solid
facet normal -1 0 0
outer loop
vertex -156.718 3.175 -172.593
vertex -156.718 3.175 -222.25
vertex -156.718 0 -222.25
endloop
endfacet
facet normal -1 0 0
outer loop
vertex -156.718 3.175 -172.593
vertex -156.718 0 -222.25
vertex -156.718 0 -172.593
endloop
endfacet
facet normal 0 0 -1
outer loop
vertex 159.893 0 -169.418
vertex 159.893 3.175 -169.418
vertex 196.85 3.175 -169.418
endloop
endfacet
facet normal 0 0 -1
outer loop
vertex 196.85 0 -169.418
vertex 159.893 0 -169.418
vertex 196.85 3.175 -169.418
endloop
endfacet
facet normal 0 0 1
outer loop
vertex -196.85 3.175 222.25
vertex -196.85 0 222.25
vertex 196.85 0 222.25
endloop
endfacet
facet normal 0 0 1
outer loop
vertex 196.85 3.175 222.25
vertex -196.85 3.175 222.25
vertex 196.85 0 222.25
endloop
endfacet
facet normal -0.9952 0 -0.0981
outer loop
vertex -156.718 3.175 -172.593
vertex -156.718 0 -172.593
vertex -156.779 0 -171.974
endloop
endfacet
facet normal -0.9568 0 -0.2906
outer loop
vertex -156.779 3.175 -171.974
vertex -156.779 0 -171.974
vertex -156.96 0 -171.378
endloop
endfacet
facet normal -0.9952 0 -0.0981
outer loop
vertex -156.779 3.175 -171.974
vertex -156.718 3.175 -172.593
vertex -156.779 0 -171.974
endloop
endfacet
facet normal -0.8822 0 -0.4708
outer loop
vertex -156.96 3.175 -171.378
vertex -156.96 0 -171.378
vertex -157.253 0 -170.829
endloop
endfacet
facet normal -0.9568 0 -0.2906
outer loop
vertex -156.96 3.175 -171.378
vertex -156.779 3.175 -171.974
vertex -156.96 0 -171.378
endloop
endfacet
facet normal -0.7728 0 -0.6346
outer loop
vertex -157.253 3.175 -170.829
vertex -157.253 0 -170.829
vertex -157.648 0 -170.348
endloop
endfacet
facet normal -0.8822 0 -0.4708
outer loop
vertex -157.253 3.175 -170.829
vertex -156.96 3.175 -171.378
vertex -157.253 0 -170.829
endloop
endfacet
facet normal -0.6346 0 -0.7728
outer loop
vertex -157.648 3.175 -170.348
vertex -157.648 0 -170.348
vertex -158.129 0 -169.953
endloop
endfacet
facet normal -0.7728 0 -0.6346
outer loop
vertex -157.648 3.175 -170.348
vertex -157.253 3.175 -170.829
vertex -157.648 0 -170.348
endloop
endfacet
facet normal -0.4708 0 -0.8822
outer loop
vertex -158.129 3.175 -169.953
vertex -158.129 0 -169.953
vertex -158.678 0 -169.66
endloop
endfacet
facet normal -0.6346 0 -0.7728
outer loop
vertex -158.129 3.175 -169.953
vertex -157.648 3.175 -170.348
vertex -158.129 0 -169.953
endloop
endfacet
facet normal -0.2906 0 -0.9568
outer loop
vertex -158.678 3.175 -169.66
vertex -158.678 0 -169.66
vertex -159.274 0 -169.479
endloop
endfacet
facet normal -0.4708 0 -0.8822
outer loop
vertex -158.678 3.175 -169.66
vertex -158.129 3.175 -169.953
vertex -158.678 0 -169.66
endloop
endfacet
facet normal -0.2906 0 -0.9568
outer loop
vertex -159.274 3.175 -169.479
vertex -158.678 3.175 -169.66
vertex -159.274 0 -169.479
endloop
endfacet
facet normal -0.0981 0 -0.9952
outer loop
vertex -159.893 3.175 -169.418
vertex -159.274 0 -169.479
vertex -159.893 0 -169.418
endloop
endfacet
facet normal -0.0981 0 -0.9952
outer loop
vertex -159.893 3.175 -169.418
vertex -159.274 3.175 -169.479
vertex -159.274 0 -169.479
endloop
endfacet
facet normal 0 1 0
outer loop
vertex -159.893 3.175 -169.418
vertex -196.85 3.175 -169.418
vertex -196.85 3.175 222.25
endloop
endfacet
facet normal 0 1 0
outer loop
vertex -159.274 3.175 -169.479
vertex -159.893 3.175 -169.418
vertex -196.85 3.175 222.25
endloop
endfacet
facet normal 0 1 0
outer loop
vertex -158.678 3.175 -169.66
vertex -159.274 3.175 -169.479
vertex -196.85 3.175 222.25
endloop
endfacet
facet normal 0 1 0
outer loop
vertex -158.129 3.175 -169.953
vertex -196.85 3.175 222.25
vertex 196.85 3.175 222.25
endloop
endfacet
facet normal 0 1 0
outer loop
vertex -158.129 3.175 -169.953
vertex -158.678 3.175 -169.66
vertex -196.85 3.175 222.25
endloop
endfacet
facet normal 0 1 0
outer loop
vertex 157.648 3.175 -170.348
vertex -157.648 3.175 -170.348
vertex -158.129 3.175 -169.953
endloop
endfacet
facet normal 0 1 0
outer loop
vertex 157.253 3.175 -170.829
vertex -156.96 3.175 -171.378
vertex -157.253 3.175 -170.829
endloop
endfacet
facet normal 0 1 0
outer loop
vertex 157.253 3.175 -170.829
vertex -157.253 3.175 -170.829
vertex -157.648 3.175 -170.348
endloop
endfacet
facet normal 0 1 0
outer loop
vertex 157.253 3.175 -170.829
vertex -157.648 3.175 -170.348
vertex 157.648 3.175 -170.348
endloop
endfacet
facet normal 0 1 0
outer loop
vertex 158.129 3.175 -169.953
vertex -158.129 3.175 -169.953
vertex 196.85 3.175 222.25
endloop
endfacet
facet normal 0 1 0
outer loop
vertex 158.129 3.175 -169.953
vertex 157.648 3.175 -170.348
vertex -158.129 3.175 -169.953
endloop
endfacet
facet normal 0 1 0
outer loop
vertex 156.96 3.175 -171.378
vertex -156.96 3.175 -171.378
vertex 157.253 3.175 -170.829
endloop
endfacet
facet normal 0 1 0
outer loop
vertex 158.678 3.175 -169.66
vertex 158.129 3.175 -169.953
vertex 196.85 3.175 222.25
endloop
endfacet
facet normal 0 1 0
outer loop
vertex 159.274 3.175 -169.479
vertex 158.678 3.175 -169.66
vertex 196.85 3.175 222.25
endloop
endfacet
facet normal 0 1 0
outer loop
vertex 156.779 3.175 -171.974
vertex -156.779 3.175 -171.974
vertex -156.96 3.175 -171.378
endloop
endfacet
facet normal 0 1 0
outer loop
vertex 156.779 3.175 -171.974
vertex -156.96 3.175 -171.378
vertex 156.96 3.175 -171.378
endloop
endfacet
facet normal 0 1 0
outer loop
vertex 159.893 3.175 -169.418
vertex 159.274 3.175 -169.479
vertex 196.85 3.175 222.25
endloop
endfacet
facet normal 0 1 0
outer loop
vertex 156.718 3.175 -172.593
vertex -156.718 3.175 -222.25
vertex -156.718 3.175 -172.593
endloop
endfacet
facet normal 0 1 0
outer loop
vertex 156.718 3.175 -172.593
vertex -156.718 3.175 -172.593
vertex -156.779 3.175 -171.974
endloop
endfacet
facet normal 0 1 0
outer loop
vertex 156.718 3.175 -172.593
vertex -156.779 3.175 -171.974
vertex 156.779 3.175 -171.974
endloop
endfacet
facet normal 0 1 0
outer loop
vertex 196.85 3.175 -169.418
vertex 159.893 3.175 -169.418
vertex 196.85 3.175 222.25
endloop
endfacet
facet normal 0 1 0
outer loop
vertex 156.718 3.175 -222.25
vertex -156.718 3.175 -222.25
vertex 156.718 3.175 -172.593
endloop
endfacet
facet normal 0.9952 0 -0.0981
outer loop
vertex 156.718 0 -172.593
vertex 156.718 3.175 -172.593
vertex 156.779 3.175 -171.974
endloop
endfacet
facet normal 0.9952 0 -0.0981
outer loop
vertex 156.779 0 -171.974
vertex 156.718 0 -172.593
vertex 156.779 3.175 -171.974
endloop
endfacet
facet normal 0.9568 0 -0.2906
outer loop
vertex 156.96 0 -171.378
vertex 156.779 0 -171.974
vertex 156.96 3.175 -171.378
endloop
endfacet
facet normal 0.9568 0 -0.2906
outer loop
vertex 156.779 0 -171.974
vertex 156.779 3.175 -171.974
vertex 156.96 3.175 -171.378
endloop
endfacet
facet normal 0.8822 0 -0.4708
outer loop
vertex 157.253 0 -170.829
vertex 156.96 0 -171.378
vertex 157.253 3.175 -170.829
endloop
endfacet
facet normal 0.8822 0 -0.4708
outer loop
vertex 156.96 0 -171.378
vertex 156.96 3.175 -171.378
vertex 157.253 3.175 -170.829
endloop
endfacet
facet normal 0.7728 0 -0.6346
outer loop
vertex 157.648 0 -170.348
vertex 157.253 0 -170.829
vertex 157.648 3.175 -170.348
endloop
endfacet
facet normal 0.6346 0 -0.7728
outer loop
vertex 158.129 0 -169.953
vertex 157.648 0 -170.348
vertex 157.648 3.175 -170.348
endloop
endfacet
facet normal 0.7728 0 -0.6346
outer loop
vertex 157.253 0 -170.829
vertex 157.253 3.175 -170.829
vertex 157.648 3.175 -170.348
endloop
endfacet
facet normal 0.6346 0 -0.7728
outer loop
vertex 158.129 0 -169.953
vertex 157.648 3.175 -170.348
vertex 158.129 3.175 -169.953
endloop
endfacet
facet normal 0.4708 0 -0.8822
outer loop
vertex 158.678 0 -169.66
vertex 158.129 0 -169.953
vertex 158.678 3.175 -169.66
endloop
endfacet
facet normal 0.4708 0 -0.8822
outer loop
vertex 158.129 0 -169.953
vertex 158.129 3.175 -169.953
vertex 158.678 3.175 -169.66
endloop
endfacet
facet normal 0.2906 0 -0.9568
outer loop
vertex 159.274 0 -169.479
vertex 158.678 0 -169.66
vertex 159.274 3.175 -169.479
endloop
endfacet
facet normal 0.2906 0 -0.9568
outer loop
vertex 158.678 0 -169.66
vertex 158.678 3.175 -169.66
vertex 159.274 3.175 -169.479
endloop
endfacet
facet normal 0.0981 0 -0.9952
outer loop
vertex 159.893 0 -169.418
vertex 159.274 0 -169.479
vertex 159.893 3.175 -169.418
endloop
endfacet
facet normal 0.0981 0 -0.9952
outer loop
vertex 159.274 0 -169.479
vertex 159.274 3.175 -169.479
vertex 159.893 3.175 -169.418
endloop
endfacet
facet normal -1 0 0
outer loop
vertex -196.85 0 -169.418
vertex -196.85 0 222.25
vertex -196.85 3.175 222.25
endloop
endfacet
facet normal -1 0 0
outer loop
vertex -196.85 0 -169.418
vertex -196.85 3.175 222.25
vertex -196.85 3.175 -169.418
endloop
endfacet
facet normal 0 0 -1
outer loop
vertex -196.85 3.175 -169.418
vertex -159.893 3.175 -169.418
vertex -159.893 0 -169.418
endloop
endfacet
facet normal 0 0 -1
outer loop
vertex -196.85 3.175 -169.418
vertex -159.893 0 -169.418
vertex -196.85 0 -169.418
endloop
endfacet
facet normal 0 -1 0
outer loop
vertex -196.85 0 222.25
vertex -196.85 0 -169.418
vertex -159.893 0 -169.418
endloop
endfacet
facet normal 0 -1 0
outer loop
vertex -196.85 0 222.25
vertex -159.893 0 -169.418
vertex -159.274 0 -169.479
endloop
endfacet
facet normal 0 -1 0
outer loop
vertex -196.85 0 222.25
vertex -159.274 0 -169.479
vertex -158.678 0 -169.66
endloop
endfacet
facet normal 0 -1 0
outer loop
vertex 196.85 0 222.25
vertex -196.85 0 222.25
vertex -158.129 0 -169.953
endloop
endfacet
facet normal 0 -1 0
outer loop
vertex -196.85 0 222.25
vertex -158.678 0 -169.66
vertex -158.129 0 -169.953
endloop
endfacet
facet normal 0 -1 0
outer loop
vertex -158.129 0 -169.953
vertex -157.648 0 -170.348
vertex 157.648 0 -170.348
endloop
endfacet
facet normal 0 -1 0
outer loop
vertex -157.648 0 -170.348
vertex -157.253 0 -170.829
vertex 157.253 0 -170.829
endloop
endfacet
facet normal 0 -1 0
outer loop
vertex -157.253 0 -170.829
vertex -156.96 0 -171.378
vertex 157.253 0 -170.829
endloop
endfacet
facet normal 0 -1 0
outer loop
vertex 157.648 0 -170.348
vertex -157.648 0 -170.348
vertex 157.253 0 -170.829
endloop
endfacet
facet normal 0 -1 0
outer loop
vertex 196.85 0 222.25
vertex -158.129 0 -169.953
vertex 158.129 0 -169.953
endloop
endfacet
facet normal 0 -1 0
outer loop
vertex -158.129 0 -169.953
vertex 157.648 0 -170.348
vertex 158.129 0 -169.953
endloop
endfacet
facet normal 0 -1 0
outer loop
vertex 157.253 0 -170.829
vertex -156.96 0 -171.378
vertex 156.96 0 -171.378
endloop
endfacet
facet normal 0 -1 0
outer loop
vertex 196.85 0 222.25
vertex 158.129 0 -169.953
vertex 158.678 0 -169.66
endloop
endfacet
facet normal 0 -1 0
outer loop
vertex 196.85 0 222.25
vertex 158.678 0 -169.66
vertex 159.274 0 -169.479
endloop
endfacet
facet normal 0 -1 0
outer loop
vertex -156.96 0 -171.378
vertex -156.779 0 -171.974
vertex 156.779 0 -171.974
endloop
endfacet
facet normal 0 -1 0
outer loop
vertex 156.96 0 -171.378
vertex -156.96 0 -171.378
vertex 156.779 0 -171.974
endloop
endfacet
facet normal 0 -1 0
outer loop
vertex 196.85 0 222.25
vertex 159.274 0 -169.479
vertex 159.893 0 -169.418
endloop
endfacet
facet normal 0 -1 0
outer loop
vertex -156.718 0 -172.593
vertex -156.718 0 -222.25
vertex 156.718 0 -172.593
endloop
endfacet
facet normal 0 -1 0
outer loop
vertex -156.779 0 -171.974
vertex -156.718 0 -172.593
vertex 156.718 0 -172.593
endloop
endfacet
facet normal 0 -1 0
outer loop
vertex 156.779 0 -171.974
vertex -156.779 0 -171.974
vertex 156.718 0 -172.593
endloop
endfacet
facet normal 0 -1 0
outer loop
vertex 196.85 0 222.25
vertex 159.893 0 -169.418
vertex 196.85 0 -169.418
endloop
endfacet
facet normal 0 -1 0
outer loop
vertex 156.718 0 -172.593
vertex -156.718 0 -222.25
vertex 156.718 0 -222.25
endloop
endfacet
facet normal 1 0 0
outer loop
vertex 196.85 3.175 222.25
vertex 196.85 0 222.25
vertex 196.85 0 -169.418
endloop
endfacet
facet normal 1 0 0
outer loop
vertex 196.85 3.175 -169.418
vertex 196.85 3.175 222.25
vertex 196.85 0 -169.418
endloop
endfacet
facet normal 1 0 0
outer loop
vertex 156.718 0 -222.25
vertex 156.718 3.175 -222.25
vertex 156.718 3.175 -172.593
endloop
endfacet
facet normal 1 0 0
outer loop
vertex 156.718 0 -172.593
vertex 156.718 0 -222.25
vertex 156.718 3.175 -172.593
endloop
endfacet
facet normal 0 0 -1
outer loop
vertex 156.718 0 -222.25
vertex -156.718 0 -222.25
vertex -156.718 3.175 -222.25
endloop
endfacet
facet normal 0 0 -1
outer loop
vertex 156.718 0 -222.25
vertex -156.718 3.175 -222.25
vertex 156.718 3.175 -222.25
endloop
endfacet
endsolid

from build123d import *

# Parameters (mm, degrees)
SKETCH1_W           = 393.7
SKETCH1_H           = 444.5
BOSS_EXTRUDE1_DEPTH = 3.175
CUT_EXTRUDE1_DEPTH  = 10


with BuildPart() as part:
    # Sketch1 → Boss-Extrude1 (new body)
    with BuildSketch(Plane(origin=(0, 0, 0), x_dir=(1, 0, 0), z_dir=(0, 1, 0))):
        Rectangle(SKETCH1_W, SKETCH1_H)
    extrude(amount=BOSS_EXTRUDE1_DEPTH)

    # Sketch2 → Cut-Extrude1 (cut)
    with BuildSketch(Plane(origin=(0, 3.175, 0), x_dir=(1, 0, 0), z_dir=(0, 1, 0))):
        with BuildLine():
            Line((-196.85, 222.25), (-156.718, 222.25))
            Line((-156.718, 222.25), (-156.718, 172.593))
            ThreePointArc((-156.718, 172.593), (-157.64793597, 170.34793597), (-159.893, 169.418))
            Line((-159.893, 169.418), (-196.85, 169.418))
            Line((-196.85, 169.418), (-196.85, 222.25))
        make_face()
        with BuildLine():
            Line((196.85, 222.25), (156.718, 222.25))
            Line((156.718, 222.25), (156.718, 172.593))
            ThreePointArc((156.718, 172.593), (157.64793597, 170.34793597), (159.893, 169.418))
            Line((159.893, 169.418), (196.85, 169.418))
            Line((196.85, 169.418), (196.85, 222.25))
        make_face()
    extrude(amount=-CUT_EXTRUDE1_DEPTH, mode=Mode.SUBTRACT)


solid = part.part
